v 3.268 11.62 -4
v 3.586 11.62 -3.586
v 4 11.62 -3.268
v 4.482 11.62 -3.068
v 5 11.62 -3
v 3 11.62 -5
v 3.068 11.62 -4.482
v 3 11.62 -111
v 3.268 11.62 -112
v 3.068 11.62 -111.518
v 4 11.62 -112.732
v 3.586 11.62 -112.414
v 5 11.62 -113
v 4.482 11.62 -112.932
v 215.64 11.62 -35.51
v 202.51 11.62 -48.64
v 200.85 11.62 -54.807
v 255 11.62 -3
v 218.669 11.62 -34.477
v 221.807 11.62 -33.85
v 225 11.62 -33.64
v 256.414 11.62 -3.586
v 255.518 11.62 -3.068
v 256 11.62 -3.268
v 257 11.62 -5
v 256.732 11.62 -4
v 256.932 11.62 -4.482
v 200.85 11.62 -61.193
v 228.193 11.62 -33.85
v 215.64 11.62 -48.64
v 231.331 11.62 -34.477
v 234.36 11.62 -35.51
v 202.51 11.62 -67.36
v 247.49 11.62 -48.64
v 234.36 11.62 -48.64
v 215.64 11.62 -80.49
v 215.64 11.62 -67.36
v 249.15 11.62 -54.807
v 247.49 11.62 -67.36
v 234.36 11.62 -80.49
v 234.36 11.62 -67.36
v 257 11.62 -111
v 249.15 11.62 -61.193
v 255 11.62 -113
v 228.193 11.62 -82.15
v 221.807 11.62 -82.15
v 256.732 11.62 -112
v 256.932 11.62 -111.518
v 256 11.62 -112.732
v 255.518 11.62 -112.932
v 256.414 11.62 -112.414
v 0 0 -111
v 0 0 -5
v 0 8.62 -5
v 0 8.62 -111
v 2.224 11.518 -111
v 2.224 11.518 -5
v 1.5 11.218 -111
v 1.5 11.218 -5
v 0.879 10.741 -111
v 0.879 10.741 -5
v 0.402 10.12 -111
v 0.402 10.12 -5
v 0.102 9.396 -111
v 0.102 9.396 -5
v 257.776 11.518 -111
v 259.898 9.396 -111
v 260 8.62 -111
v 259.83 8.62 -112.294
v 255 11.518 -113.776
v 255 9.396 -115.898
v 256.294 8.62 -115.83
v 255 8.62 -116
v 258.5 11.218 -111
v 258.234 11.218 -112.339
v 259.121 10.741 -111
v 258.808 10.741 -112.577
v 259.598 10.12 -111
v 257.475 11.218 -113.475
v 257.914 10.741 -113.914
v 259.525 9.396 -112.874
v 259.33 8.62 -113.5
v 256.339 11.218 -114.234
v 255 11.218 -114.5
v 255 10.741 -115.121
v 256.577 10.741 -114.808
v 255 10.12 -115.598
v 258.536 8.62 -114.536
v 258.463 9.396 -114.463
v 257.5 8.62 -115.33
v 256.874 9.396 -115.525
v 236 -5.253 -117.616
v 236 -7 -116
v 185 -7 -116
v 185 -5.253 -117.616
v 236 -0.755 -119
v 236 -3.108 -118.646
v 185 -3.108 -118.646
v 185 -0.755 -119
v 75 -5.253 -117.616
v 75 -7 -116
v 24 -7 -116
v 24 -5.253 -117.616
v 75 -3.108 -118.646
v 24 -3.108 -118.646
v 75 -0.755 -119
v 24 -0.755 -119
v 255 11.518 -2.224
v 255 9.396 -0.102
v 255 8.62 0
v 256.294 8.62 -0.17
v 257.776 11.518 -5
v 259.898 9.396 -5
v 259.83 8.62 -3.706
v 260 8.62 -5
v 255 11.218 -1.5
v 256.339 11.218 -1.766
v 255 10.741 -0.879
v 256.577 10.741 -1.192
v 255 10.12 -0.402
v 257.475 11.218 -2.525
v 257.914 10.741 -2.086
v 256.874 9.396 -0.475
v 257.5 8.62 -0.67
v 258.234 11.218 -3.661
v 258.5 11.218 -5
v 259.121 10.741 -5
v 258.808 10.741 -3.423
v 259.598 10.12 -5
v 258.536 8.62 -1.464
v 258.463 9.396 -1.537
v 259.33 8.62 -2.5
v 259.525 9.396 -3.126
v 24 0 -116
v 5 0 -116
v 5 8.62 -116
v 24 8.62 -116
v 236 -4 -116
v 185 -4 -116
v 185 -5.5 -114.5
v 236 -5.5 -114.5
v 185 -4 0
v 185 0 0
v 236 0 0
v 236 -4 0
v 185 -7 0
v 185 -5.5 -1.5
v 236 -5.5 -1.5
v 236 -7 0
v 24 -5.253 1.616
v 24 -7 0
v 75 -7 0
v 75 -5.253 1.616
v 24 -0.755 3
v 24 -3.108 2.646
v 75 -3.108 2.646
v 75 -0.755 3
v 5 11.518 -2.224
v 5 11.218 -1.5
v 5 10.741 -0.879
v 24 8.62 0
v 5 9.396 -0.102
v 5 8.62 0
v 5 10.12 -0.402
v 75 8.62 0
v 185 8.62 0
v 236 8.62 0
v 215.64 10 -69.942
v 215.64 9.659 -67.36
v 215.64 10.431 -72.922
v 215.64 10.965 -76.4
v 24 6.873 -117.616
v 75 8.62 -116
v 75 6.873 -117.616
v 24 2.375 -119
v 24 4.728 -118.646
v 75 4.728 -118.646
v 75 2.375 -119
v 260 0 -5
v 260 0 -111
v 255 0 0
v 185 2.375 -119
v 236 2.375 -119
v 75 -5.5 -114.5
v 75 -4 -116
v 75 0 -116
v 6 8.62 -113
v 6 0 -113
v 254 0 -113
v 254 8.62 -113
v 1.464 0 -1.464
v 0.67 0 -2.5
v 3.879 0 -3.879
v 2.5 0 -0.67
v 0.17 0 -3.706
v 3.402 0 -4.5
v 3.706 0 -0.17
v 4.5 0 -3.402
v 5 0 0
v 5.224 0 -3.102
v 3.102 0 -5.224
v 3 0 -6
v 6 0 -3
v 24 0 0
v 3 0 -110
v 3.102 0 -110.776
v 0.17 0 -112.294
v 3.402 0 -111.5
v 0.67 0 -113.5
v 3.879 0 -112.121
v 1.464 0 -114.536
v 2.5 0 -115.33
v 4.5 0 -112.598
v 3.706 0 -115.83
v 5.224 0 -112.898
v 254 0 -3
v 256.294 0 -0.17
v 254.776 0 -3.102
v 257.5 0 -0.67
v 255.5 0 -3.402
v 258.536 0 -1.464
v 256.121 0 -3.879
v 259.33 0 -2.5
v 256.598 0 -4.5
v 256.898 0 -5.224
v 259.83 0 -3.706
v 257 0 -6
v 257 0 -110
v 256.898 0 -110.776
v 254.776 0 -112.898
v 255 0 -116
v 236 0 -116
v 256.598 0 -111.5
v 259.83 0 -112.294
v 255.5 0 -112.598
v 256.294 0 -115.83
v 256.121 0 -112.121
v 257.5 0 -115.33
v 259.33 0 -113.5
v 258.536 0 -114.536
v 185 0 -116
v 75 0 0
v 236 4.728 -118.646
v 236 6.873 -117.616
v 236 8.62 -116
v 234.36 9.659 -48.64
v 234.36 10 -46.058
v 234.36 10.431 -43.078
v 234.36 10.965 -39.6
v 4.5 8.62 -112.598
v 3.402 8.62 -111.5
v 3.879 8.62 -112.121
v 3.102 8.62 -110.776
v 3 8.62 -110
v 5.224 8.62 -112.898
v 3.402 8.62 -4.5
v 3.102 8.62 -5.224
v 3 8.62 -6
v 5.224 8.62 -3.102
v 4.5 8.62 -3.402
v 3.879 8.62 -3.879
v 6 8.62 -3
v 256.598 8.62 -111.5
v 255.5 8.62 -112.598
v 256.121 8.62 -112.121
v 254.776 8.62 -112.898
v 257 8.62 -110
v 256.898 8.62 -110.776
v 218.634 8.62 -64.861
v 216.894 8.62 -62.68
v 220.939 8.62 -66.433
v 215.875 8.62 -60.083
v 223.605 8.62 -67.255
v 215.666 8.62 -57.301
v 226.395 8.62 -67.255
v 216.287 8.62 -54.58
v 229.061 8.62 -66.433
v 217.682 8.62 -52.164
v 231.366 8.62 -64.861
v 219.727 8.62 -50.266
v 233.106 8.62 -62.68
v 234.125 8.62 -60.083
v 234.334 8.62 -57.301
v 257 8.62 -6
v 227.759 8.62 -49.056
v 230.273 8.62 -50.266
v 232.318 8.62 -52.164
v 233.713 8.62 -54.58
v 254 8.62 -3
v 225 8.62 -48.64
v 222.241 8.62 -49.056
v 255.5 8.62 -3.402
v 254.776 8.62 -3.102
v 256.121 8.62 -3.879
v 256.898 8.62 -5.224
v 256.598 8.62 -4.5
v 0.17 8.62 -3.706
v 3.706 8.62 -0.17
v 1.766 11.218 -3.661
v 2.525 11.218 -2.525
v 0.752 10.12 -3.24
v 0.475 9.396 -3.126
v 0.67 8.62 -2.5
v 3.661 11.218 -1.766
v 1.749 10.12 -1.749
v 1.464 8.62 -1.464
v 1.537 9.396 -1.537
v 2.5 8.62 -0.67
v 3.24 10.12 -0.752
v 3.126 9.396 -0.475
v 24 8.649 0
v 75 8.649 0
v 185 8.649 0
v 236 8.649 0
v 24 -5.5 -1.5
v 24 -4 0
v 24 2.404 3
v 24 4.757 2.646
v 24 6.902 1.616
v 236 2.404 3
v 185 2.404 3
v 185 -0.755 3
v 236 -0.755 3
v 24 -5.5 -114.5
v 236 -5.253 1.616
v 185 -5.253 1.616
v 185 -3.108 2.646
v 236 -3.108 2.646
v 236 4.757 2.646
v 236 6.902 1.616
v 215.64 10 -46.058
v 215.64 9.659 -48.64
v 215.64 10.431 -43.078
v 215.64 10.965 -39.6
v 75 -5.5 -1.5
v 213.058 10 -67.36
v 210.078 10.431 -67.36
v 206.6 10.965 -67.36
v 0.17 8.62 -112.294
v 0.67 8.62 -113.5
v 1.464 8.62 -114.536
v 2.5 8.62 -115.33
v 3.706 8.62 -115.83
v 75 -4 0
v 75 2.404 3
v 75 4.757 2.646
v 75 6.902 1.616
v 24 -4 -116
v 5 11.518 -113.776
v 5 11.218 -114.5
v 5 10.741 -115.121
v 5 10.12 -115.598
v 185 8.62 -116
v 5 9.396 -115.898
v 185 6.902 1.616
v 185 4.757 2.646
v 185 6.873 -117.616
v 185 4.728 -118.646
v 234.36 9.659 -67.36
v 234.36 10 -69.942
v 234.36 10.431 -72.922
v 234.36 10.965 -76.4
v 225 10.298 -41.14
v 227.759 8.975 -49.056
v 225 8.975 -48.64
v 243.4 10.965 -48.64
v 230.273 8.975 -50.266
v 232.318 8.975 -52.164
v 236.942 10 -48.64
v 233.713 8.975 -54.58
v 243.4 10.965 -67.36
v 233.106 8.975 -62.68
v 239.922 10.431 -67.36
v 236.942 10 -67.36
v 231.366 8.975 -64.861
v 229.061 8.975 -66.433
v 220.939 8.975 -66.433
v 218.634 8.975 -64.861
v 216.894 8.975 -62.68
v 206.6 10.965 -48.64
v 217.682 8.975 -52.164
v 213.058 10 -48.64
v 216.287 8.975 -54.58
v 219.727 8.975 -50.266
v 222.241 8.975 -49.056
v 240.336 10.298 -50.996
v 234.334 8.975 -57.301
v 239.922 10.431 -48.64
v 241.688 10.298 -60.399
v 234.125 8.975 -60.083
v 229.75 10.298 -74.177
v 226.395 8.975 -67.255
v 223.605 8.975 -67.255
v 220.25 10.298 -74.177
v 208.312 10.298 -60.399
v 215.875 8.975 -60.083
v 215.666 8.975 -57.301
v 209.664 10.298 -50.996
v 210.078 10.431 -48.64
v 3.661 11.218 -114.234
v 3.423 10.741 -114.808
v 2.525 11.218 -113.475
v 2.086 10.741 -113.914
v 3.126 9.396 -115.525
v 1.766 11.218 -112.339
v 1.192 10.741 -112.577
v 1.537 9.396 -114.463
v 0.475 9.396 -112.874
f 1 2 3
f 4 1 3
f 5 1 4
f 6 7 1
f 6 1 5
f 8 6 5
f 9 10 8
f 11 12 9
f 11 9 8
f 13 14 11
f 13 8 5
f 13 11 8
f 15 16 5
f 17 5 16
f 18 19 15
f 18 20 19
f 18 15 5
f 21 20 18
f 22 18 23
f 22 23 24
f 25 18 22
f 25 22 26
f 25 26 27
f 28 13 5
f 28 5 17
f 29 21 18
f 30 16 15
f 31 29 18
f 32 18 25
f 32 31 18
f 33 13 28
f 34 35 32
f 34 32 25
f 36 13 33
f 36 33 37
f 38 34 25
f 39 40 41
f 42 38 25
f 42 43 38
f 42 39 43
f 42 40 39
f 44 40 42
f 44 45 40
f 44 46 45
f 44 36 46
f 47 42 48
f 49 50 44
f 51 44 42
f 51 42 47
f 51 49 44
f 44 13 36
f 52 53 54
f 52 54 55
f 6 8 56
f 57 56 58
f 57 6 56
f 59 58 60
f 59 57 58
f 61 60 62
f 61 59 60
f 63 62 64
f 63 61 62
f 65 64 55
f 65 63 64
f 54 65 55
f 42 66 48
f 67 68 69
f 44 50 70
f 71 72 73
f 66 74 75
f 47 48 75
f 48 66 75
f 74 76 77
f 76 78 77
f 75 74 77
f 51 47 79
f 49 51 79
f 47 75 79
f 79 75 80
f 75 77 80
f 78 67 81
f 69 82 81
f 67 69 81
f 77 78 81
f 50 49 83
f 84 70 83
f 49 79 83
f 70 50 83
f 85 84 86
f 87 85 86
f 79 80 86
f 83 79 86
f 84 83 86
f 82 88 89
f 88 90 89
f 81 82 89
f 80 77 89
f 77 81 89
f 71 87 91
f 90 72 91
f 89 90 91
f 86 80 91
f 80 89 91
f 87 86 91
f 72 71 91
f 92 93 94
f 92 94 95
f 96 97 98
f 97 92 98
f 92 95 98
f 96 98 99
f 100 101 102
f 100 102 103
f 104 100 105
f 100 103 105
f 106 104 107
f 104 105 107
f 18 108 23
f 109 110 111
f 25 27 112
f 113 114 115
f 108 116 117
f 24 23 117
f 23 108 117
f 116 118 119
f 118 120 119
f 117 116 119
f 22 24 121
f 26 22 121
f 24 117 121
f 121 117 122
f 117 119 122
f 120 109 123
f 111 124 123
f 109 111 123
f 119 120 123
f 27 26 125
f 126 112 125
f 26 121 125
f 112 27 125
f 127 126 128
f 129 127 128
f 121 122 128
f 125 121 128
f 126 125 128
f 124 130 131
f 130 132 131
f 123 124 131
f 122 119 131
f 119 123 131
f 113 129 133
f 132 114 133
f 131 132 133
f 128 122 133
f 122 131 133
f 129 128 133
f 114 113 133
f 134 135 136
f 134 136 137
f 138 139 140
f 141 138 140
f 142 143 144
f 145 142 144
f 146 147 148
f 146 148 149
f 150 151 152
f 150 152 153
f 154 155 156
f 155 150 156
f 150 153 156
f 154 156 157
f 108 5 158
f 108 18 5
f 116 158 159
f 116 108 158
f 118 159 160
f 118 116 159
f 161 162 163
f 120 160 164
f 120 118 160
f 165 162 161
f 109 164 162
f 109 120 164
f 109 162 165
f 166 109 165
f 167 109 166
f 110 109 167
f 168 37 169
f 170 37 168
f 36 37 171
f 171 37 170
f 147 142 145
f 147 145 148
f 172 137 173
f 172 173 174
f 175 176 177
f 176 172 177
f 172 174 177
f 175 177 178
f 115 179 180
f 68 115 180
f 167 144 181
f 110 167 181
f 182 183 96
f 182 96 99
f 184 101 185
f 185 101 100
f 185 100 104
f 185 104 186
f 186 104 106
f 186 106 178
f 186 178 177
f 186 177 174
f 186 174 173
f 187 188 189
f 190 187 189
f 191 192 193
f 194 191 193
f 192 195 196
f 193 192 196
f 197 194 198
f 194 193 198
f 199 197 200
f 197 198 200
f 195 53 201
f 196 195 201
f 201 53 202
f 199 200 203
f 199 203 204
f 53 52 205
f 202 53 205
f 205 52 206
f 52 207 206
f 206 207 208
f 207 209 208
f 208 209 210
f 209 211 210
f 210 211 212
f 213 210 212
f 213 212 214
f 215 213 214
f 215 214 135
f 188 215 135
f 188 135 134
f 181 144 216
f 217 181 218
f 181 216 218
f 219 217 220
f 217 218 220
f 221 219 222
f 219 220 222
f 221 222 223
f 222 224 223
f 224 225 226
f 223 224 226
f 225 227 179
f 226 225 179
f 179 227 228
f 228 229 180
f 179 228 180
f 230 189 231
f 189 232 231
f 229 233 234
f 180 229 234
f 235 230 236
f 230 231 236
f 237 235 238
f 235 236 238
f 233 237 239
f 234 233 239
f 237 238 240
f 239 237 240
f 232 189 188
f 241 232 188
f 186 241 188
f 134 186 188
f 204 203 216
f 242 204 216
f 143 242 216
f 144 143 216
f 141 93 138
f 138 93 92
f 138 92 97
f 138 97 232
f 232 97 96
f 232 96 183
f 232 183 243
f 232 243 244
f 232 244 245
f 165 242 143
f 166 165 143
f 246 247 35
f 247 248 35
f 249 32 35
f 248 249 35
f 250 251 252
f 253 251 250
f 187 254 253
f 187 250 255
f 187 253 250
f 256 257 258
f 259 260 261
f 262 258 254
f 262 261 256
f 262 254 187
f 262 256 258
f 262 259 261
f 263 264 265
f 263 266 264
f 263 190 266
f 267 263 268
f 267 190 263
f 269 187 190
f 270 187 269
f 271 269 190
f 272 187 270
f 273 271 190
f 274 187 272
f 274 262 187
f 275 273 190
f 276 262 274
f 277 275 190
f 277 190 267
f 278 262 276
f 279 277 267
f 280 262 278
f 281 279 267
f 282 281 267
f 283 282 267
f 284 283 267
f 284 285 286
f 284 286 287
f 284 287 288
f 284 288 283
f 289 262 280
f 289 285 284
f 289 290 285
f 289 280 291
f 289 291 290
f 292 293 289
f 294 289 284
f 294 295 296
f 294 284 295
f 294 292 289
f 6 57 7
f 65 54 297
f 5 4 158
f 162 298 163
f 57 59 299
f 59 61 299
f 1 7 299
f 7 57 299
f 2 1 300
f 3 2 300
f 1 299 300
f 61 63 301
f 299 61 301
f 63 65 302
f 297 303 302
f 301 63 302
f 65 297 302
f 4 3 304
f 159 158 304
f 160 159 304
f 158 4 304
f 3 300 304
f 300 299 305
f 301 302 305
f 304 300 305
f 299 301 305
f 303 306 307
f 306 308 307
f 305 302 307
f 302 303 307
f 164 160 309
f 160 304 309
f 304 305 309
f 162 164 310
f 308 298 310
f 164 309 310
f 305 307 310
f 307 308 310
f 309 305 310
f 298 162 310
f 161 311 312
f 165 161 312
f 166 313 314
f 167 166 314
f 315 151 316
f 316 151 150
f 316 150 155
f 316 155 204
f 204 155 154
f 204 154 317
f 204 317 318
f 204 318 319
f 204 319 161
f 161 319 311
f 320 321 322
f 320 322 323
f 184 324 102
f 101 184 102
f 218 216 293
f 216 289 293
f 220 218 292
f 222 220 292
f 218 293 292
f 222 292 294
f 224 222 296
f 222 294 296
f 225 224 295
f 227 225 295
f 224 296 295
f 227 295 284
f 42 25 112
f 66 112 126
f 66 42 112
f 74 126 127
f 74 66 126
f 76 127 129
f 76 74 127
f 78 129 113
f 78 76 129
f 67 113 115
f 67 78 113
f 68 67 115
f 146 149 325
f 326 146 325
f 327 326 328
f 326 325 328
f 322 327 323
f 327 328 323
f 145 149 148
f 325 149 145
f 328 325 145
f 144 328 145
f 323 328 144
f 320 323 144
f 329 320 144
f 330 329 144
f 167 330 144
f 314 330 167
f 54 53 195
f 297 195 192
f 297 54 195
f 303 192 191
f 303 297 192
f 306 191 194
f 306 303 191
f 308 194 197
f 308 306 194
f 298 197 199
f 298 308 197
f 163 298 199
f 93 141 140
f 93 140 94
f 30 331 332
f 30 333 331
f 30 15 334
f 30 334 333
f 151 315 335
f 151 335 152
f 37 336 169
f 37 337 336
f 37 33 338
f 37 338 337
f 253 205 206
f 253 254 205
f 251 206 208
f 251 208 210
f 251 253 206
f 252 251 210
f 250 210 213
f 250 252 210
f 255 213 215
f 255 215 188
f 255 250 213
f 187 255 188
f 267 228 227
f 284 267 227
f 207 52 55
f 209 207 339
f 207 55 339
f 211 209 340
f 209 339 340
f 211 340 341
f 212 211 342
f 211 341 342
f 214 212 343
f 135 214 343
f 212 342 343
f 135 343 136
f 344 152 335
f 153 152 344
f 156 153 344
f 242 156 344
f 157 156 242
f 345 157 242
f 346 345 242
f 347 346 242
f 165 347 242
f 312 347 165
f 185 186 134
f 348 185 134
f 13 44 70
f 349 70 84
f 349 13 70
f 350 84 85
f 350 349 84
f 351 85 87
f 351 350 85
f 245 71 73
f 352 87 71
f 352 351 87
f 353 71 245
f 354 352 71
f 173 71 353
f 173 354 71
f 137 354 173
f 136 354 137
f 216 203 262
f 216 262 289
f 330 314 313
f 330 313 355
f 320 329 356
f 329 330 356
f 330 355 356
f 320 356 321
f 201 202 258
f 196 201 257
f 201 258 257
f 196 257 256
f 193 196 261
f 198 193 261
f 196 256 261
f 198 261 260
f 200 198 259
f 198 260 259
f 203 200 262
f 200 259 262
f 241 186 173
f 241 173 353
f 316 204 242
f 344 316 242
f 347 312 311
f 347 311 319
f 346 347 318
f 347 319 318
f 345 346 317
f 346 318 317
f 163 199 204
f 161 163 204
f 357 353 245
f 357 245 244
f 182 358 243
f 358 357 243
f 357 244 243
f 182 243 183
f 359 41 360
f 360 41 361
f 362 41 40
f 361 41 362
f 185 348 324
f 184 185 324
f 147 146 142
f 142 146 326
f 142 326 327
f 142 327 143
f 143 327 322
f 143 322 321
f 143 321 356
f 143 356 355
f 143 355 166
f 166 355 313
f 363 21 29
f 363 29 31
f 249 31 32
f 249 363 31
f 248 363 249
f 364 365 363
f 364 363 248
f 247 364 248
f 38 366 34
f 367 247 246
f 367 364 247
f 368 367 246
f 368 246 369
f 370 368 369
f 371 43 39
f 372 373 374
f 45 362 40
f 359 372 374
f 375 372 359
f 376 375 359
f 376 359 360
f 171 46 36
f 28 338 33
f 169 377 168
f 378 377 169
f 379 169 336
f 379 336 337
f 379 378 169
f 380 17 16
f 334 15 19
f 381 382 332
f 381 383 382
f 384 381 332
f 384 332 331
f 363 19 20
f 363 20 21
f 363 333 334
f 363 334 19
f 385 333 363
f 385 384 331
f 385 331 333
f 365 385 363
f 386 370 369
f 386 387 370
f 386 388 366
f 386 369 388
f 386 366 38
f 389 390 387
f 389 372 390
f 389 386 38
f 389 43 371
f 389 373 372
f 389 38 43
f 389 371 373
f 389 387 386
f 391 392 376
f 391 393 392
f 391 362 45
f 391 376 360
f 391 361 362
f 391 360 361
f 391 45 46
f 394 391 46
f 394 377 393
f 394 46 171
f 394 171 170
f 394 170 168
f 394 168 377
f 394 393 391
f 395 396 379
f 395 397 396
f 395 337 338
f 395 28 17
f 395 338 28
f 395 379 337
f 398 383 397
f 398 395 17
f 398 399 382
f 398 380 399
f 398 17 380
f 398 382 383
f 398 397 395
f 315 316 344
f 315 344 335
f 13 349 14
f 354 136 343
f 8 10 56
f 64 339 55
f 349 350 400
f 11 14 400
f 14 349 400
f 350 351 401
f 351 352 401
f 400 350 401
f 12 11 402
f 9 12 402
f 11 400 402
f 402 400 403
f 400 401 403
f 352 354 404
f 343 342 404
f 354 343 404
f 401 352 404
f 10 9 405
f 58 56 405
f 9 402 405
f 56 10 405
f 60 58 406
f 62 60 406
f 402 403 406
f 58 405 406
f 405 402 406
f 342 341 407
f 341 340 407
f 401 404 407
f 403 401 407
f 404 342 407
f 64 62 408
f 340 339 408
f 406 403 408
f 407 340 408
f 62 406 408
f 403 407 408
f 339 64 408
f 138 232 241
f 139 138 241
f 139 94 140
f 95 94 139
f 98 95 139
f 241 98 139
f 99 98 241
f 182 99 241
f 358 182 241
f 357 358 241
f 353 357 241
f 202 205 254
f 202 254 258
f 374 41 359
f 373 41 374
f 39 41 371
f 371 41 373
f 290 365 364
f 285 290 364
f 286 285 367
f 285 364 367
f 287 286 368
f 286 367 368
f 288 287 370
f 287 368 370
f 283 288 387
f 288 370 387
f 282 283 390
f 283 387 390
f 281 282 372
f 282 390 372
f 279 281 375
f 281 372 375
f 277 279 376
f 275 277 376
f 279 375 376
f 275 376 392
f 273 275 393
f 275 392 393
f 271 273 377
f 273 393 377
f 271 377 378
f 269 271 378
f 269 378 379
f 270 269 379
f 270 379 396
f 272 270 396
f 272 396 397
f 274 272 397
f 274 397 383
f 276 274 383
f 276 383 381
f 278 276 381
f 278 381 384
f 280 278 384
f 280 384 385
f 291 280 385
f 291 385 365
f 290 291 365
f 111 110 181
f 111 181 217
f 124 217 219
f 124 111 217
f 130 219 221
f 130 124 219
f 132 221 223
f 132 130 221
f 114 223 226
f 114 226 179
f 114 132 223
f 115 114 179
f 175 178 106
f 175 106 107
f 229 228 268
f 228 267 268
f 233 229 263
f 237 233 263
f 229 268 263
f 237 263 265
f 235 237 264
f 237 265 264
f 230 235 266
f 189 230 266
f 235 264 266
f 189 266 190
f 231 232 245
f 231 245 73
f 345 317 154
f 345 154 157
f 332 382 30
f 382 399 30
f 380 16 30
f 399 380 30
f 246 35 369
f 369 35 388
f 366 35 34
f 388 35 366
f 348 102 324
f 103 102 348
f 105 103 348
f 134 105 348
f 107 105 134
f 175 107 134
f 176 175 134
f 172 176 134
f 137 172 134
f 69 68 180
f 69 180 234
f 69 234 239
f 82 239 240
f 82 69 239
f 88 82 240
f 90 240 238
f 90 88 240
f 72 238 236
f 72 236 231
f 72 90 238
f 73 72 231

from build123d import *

# Parameters (mm, degrees)
SKETCH1_W              = 260
SKETCH1_H              = 116
BOSS_EXTRUDE1_DEPTH    = 11.62
FILLET1_R              = 5
FILLET2_R              = 3
SKETCH2_W              = 254
SKETCH2_H              = 110
CUT_EXTRUDE1_DEPTH     = 8.62
FILLET3_R              = 3
SKETCH6_R              = 9.3599
CUT_EXTRUDE4_DEPTH     = 8.636
SKETCH7_W              = 51
SKETCH7_H              = 15.649055797
BOSS_EXTRUDE3_DEPTH    = 3
FILLET6_R              = 8
FILLET7_R              = 8
SKETCH8_W              = 51
SKETCH8_H              = 3
BOSS_EXTRUDE4_DEPTH    = 1.5
CUT_EXTRUDE5_DEPTH     = 55
LPATTERN2_COUNT        = 2
LPATTERN2_PITCH        = 161
FILLET6_OF_LPATTERN2_R = 8
FILLET7_OF_LPATTERN2_R = 8
SKETCH10_W             = 51
SKETCH10_H             = 15.62
BOSS_EXTRUDE5_DEPTH    = 3
FILLET8_R              = 8
SKETCH11_W             = 51
SKETCH11_H             = 3
BOSS_EXTRUDE6_DEPTH    = 1.5
CUT_EXTRUDE6_DEPTH     = 55
LPATTERN3_COUNT        = 2
LPATTERN3_PITCH        = 161
FILLET8_OF_LPATTERN3_R = 8
CHAMFER1_SIZE          = 15
CHAMFER1_SIZE2         = 2.644904711
SKETCH13_W             = 18.833961405
SKETCH13_H             = 27.155748893
SKETCH13_W_2           = 23.540134481
SKETCH13_H_2           = 26.001362064
SKETCH13_W_3           = 13.410899097
SKETCH13_H_3           = 18.756893662
SKETCH13_W_4           = 15.344585033
SKETCH13_H_4           = 16.316593901
BOSS_EXTRUDE7_DEPTH    = 3


with BuildPart() as part:
    # Sketch1 → Boss-Extrude1 (new body)
    with BuildSketch(Plane(origin=(0, 0, 0), x_dir=(1, 0, 0), z_dir=(0, 1, 0))):
        with Locations((130, 58)):
            Rectangle(SKETCH1_W, SKETCH1_H)
    extrude(amount=BOSS_EXTRUDE1_DEPTH)

    # Fillet1
    fillet1_edges = [part.edges().sort_by_distance(p)[0] for p in [
        (0, 5.81, -116),
        (260, 5.81, -116),
        (260, 5.81, 0),
        (0, 5.81, 0),
    ]]
    fillet(fillet1_edges, radius=FILLET1_R)

    # Fillet2
    fillet2_edges = [part.edges().sort_by_distance(p)[0] for p in [
        (130, 11.62, 0),
        (0, 11.62, -58),
        (260, 11.62, -58),
        (130, 11.62, -116),
        (1.464466094, 11.62, -114.535533906),
        (258.535533906, 11.62, -114.535533906),
        (258.535533906, 11.62, -1.464466094),
        (1.464466094, 11.62, -1.464466094),
    ]]
    fillet(fillet2_edges, radius=FILLET2_R)

    # Sketch2 → Cut-Extrude1 (cut)
    with BuildSketch(Plane.XZ):
        with Locations((130, -58)):
            Rectangle(SKETCH2_W, SKETCH2_H)
    extrude(amount=-CUT_EXTRUDE1_DEPTH, mode=Mode.SUBTRACT)

    # Fillet3
    fillet3_edges = [part.edges().sort_by_distance(p)[0] for p in [
        (3, 4.31, -113),
        (3, 4.31, -3),
        (257, 4.31, -3),
        (257, 4.31, -113),
    ]]
    fillet(fillet3_edges, radius=FILLET3_R)

    # Sketch6 → Cut-Extrude4 (cut)
    with BuildSketch(Plane(origin=(0, 11.62, 0), x_dir=(1, 0, 0), z_dir=(0, 1, 0))):
        with Locations(Location((225, 58, 0), (0, 0, 270))):
            Circle(SKETCH6_R)
    extrude(amount=-CUT_EXTRUDE4_DEPTH, mode=Mode.SUBTRACT)

    # Sketch7 → Boss-Extrude3 (add)
    with BuildSketch(Plane.XY):
        with Locations((49.5, 0.824527899)):
            Rectangle(SKETCH7_W, SKETCH7_H)
    boss_extrude3 = extrude(amount=BOSS_EXTRUDE3_DEPTH)

    # Fillet6
    # the kernel refuses this fillet: 8 mm, written as the material it takes off along each edge
    with BuildSketch(Plane(origin=(8.387505004, 8.649055797, 3), x_dir=(0, 0, -1), z_dir=(1, 0, 0))) as fillet6_piece_1:
        with BuildLine():
            CenterArc((8, -6.244997998), FILLET6_R, 128.682187453, 51.317812547)
            Line((0, -6.244997998), (-0.16, -6.244997998))
            Line((-0.16, -6.244997998), (-0.16, 0))
            Line((-0.16, 0), (0, 0.16))
            ThreePointArc((0, 0.16), (1.5, 0.16), (2.9, 0.12489996))
            Line((2.9, 0.12489996), (3, 0))
        make_face()
    extrude(amount=82.224989992, mode=Mode.SUBTRACT)

    # Fillet7
    # the kernel refuses this fillet: 8 mm, written as the material it takes off along each edge
    with BuildSketch(Plane(origin=(90.612494996, -7, 3), x_dir=(0, 0, -1), z_dir=(-1, 0, 0))) as fillet7_piece_1:
        with BuildLine():
            CenterArc((8, -6.244997998), FILLET7_R, 128.682187453, 51.317812547)
            Line((0, -6.244997998), (-0.16, -6.244997998))
            Line((-0.16, -6.244997998), (-0.16, 0))
            Line((-0.16, 0), (0, 0.16))
            ThreePointArc((0, 0.16), (1.5, 0.16), (2.9, 0.12489996))
            Line((2.9, 0.12489996), (3, 0))
        make_face()
    extrude(amount=82.224989992, mode=Mode.SUBTRACT)

    # Sketch8 → Boss-Extrude4 (add)
    with BuildSketch(Plane(origin=(0, 0, 0), x_dir=(-1, 0, 0), z_dir=(0, 0, -1))):
        with Locations((-49.5, -5.5)):
            Rectangle(SKETCH8_W, SKETCH8_H)
    boss_extrude4 = extrude(amount=BOSS_EXTRUDE4_DEPTH)

    # Sketch9 → Cut-Extrude5 (cut)
    with BuildSketch(Plane.ZY.offset(-24)):
        Polygon((0, -4), (-1.5, -5.5), (0, -7), (-1.5, -7), (-2.053402402, -7), (-2.053402402, -4), (-1.5, -4), align=None)
    cut_extrude5 = extrude(amount=-CUT_EXTRUDE5_DEPTH, mode=Mode.SUBTRACT)

    # LPattern2: Boss-Extrude3, Boss-Extrude4, Cut-Extrude5 ×2
    with Locations(*[(i * LPATTERN2_PITCH, 0, 0) for i in range(1, LPATTERN2_COUNT)]):
        add(boss_extrude3)
        add(boss_extrude4)
        add(cut_extrude5, mode=Mode.SUBTRACT)

    # Fillet6 of LPattern2
    # the kernel refuses this fillet: 8 mm, written as the material it takes off along each edge
    with BuildSketch(Plane(origin=(169.387505004, 8.649055797, 3), x_dir=(0, 0, -1), z_dir=(1, 0, 0))) as fillet6_of_lpattern2_piece_1:
        with BuildLine():
            CenterArc((8, -6.244997998), FILLET6_OF_LPATTERN2_R, 128.682187453, 51.317812547)
            Line((0, -6.244997998), (-0.16, -6.244997998))
            Line((-0.16, -6.244997998), (-0.16, 0))
            Line((-0.16, 0), (0, 0.16))
            ThreePointArc((0, 0.16), (1.5, 0.16), (2.9, 0.12489996))
            Line((2.9, 0.12489996), (3, 0))
        make_face()
    extrude(amount=82.224989992, mode=Mode.SUBTRACT)

    # Fillet7 of LPattern2
    # the kernel refuses this fillet: 8 mm, written as the material it takes off along each edge
    with BuildSketch(Plane(origin=(251.612494996, -7, 3), x_dir=(0, 1, 0), z_dir=(-1, 0, 0))) as fillet7_of_lpattern2_piece_1:
        with BuildLine():
            CenterArc((6.244997998, 8), FILLET7_OF_LPATTERN2_R, 218.682187453, 51.317812547)
            Line((0, 3), (-0.12489996, 2.9))
            ThreePointArc((-0.12489996, 2.9), (-0.16, 1.5), (-0.16, 0))
            Line((-0.16, 0), (0, -0.16))
            Line((0, -0.16), (6.244997998, -0.16))
            Line((6.244997998, -0.16), (6.244997998, 0))
        make_face()
    extrude(amount=82.224989992, mode=Mode.SUBTRACT)

    # Sketch10 → Boss-Extrude5 (add)
    with BuildSketch(Plane(origin=(0, 0, -116), x_dir=(-1, 0, 0), z_dir=(0, 0, -1))):
        with Locations((-49.5, 0.81)):
            Rectangle(SKETCH10_W, SKETCH10_H)
    boss_extrude5 = extrude(amount=BOSS_EXTRUDE5_DEPTH)

    # Fillet8
    # the kernel refuses this fillet: 8 mm, written as the material it takes off along each edge
    with BuildSketch(Plane(origin=(8.387505004, -7, -119), x_dir=(0, 0, 1), z_dir=(1, 0, 0)), Plane(origin=(90.612494996, 8.62, -119), x_dir=(0, 0, 1), z_dir=(-1, 0, 0))) as fillet8_piece_1:
        with BuildLine():
            CenterArc((8, -6.244997998), FILLET8_R, 128.682187453, 51.317812547)
            Line((0, -6.244997998), (-0.16, -6.244997998))
            Line((-0.16, -6.244997998), (-0.16, 0))
            Line((-0.16, 0), (0, 0.16))
            ThreePointArc((0, 0.16), (1.5, 0.16), (2.9, 0.12489996))
            Line((2.9, 0.12489996), (3, 0))
        make_face()
    extrude(amount=82.224989992, mode=Mode.SUBTRACT)

    # Sketch11 → Boss-Extrude6 (add)
    with BuildSketch(Plane.XY.offset(-116)):
        with Locations((49.5, -5.5)):
            Rectangle(SKETCH11_W, SKETCH11_H)
    boss_extrude6 = extrude(amount=BOSS_EXTRUDE6_DEPTH)

    # Sketch12 → Cut-Extrude6 (cut)
    with BuildSketch(Plane.ZY.offset(-24)):
        Polygon((-116, -4), (-114.5, -5.5), (-116, -7), (-111.986018157, -7), (-111.986018157, -3.7983216), align=None)
    cut_extrude6 = extrude(amount=-CUT_EXTRUDE6_DEPTH, mode=Mode.SUBTRACT)

    # LPattern3: Boss-Extrude5, Boss-Extrude6, Cut-Extrude6 ×2
    with Locations(*[(i * LPATTERN3_PITCH, 0, 0) for i in range(1, LPATTERN3_COUNT)]):
        add(boss_extrude5)
        add(boss_extrude6)
        add(cut_extrude6, mode=Mode.SUBTRACT)

    # Fillet8 of LPattern3
    # the kernel refuses this fillet: 8 mm, written as the material it takes off along each edge
    with BuildSketch(Plane(origin=(169.387505004, -7, -119), x_dir=(0, 0, 1), z_dir=(1, 0, 0)), Plane(origin=(251.612494996, 8.62, -119), x_dir=(0, 0, 1), z_dir=(-1, 0, 0))) as fillet8_of_lpattern3_piece_1:
        with BuildLine():
            CenterArc((8, -6.244997998), FILLET8_OF_LPATTERN3_R, 128.682187453, 51.317812547)
            Line((0, -6.244997998), (-0.16, -6.244997998))
            Line((-0.16, -6.244997998), (-0.16, 0))
            Line((-0.16, 0), (0, 0.16))
            ThreePointArc((0, 0.16), (1.5, 0.16), (2.9, 0.12489996))
            Line((2.9, 0.12489996), (3, 0))
        make_face()
    extrude(amount=82.224989992, mode=Mode.SUBTRACT)

    # Chamfer1
    chamfer1_edges = [part.edges().sort_by_distance(p)[0] for p in [
        (225, 11.62, -67.3599),
    ]]
    chamfer1_side = [part.faces().sort_by_distance(p)[0] for p in [
        (129.054758669, 11.62, -58),
    ]]
    chamfer(chamfer1_edges, length=CHAMFER1_SIZE, length2=CHAMFER1_SIZE2, reference=chamfer1_side[0])

    # Sketch13 → Boss-Extrude7 (add)
    with BuildSketch(Plane(origin=(0, 11.62, 0), x_dir=(1, 0, 0), z_dir=(0, 1, 0))):
        with Locations((243.776980702, 80.937874447)):
            Rectangle(SKETCH13_W, SKETCH13_H)
        with Locations((203.86993276, 80.360681032)):
            Rectangle(SKETCH13_W_2, SKETCH13_H_2)
        with Locations((241.065449548, 39.261553169)):
            Rectangle(SKETCH13_W_3, SKETCH13_H_3)
        with Locations((207.967707484, 40.481703049)):
            Rectangle(SKETCH13_W_4, SKETCH13_H_4)
    extrude(amount=-BOSS_EXTRUDE7_DEPTH)


solid = part.part
